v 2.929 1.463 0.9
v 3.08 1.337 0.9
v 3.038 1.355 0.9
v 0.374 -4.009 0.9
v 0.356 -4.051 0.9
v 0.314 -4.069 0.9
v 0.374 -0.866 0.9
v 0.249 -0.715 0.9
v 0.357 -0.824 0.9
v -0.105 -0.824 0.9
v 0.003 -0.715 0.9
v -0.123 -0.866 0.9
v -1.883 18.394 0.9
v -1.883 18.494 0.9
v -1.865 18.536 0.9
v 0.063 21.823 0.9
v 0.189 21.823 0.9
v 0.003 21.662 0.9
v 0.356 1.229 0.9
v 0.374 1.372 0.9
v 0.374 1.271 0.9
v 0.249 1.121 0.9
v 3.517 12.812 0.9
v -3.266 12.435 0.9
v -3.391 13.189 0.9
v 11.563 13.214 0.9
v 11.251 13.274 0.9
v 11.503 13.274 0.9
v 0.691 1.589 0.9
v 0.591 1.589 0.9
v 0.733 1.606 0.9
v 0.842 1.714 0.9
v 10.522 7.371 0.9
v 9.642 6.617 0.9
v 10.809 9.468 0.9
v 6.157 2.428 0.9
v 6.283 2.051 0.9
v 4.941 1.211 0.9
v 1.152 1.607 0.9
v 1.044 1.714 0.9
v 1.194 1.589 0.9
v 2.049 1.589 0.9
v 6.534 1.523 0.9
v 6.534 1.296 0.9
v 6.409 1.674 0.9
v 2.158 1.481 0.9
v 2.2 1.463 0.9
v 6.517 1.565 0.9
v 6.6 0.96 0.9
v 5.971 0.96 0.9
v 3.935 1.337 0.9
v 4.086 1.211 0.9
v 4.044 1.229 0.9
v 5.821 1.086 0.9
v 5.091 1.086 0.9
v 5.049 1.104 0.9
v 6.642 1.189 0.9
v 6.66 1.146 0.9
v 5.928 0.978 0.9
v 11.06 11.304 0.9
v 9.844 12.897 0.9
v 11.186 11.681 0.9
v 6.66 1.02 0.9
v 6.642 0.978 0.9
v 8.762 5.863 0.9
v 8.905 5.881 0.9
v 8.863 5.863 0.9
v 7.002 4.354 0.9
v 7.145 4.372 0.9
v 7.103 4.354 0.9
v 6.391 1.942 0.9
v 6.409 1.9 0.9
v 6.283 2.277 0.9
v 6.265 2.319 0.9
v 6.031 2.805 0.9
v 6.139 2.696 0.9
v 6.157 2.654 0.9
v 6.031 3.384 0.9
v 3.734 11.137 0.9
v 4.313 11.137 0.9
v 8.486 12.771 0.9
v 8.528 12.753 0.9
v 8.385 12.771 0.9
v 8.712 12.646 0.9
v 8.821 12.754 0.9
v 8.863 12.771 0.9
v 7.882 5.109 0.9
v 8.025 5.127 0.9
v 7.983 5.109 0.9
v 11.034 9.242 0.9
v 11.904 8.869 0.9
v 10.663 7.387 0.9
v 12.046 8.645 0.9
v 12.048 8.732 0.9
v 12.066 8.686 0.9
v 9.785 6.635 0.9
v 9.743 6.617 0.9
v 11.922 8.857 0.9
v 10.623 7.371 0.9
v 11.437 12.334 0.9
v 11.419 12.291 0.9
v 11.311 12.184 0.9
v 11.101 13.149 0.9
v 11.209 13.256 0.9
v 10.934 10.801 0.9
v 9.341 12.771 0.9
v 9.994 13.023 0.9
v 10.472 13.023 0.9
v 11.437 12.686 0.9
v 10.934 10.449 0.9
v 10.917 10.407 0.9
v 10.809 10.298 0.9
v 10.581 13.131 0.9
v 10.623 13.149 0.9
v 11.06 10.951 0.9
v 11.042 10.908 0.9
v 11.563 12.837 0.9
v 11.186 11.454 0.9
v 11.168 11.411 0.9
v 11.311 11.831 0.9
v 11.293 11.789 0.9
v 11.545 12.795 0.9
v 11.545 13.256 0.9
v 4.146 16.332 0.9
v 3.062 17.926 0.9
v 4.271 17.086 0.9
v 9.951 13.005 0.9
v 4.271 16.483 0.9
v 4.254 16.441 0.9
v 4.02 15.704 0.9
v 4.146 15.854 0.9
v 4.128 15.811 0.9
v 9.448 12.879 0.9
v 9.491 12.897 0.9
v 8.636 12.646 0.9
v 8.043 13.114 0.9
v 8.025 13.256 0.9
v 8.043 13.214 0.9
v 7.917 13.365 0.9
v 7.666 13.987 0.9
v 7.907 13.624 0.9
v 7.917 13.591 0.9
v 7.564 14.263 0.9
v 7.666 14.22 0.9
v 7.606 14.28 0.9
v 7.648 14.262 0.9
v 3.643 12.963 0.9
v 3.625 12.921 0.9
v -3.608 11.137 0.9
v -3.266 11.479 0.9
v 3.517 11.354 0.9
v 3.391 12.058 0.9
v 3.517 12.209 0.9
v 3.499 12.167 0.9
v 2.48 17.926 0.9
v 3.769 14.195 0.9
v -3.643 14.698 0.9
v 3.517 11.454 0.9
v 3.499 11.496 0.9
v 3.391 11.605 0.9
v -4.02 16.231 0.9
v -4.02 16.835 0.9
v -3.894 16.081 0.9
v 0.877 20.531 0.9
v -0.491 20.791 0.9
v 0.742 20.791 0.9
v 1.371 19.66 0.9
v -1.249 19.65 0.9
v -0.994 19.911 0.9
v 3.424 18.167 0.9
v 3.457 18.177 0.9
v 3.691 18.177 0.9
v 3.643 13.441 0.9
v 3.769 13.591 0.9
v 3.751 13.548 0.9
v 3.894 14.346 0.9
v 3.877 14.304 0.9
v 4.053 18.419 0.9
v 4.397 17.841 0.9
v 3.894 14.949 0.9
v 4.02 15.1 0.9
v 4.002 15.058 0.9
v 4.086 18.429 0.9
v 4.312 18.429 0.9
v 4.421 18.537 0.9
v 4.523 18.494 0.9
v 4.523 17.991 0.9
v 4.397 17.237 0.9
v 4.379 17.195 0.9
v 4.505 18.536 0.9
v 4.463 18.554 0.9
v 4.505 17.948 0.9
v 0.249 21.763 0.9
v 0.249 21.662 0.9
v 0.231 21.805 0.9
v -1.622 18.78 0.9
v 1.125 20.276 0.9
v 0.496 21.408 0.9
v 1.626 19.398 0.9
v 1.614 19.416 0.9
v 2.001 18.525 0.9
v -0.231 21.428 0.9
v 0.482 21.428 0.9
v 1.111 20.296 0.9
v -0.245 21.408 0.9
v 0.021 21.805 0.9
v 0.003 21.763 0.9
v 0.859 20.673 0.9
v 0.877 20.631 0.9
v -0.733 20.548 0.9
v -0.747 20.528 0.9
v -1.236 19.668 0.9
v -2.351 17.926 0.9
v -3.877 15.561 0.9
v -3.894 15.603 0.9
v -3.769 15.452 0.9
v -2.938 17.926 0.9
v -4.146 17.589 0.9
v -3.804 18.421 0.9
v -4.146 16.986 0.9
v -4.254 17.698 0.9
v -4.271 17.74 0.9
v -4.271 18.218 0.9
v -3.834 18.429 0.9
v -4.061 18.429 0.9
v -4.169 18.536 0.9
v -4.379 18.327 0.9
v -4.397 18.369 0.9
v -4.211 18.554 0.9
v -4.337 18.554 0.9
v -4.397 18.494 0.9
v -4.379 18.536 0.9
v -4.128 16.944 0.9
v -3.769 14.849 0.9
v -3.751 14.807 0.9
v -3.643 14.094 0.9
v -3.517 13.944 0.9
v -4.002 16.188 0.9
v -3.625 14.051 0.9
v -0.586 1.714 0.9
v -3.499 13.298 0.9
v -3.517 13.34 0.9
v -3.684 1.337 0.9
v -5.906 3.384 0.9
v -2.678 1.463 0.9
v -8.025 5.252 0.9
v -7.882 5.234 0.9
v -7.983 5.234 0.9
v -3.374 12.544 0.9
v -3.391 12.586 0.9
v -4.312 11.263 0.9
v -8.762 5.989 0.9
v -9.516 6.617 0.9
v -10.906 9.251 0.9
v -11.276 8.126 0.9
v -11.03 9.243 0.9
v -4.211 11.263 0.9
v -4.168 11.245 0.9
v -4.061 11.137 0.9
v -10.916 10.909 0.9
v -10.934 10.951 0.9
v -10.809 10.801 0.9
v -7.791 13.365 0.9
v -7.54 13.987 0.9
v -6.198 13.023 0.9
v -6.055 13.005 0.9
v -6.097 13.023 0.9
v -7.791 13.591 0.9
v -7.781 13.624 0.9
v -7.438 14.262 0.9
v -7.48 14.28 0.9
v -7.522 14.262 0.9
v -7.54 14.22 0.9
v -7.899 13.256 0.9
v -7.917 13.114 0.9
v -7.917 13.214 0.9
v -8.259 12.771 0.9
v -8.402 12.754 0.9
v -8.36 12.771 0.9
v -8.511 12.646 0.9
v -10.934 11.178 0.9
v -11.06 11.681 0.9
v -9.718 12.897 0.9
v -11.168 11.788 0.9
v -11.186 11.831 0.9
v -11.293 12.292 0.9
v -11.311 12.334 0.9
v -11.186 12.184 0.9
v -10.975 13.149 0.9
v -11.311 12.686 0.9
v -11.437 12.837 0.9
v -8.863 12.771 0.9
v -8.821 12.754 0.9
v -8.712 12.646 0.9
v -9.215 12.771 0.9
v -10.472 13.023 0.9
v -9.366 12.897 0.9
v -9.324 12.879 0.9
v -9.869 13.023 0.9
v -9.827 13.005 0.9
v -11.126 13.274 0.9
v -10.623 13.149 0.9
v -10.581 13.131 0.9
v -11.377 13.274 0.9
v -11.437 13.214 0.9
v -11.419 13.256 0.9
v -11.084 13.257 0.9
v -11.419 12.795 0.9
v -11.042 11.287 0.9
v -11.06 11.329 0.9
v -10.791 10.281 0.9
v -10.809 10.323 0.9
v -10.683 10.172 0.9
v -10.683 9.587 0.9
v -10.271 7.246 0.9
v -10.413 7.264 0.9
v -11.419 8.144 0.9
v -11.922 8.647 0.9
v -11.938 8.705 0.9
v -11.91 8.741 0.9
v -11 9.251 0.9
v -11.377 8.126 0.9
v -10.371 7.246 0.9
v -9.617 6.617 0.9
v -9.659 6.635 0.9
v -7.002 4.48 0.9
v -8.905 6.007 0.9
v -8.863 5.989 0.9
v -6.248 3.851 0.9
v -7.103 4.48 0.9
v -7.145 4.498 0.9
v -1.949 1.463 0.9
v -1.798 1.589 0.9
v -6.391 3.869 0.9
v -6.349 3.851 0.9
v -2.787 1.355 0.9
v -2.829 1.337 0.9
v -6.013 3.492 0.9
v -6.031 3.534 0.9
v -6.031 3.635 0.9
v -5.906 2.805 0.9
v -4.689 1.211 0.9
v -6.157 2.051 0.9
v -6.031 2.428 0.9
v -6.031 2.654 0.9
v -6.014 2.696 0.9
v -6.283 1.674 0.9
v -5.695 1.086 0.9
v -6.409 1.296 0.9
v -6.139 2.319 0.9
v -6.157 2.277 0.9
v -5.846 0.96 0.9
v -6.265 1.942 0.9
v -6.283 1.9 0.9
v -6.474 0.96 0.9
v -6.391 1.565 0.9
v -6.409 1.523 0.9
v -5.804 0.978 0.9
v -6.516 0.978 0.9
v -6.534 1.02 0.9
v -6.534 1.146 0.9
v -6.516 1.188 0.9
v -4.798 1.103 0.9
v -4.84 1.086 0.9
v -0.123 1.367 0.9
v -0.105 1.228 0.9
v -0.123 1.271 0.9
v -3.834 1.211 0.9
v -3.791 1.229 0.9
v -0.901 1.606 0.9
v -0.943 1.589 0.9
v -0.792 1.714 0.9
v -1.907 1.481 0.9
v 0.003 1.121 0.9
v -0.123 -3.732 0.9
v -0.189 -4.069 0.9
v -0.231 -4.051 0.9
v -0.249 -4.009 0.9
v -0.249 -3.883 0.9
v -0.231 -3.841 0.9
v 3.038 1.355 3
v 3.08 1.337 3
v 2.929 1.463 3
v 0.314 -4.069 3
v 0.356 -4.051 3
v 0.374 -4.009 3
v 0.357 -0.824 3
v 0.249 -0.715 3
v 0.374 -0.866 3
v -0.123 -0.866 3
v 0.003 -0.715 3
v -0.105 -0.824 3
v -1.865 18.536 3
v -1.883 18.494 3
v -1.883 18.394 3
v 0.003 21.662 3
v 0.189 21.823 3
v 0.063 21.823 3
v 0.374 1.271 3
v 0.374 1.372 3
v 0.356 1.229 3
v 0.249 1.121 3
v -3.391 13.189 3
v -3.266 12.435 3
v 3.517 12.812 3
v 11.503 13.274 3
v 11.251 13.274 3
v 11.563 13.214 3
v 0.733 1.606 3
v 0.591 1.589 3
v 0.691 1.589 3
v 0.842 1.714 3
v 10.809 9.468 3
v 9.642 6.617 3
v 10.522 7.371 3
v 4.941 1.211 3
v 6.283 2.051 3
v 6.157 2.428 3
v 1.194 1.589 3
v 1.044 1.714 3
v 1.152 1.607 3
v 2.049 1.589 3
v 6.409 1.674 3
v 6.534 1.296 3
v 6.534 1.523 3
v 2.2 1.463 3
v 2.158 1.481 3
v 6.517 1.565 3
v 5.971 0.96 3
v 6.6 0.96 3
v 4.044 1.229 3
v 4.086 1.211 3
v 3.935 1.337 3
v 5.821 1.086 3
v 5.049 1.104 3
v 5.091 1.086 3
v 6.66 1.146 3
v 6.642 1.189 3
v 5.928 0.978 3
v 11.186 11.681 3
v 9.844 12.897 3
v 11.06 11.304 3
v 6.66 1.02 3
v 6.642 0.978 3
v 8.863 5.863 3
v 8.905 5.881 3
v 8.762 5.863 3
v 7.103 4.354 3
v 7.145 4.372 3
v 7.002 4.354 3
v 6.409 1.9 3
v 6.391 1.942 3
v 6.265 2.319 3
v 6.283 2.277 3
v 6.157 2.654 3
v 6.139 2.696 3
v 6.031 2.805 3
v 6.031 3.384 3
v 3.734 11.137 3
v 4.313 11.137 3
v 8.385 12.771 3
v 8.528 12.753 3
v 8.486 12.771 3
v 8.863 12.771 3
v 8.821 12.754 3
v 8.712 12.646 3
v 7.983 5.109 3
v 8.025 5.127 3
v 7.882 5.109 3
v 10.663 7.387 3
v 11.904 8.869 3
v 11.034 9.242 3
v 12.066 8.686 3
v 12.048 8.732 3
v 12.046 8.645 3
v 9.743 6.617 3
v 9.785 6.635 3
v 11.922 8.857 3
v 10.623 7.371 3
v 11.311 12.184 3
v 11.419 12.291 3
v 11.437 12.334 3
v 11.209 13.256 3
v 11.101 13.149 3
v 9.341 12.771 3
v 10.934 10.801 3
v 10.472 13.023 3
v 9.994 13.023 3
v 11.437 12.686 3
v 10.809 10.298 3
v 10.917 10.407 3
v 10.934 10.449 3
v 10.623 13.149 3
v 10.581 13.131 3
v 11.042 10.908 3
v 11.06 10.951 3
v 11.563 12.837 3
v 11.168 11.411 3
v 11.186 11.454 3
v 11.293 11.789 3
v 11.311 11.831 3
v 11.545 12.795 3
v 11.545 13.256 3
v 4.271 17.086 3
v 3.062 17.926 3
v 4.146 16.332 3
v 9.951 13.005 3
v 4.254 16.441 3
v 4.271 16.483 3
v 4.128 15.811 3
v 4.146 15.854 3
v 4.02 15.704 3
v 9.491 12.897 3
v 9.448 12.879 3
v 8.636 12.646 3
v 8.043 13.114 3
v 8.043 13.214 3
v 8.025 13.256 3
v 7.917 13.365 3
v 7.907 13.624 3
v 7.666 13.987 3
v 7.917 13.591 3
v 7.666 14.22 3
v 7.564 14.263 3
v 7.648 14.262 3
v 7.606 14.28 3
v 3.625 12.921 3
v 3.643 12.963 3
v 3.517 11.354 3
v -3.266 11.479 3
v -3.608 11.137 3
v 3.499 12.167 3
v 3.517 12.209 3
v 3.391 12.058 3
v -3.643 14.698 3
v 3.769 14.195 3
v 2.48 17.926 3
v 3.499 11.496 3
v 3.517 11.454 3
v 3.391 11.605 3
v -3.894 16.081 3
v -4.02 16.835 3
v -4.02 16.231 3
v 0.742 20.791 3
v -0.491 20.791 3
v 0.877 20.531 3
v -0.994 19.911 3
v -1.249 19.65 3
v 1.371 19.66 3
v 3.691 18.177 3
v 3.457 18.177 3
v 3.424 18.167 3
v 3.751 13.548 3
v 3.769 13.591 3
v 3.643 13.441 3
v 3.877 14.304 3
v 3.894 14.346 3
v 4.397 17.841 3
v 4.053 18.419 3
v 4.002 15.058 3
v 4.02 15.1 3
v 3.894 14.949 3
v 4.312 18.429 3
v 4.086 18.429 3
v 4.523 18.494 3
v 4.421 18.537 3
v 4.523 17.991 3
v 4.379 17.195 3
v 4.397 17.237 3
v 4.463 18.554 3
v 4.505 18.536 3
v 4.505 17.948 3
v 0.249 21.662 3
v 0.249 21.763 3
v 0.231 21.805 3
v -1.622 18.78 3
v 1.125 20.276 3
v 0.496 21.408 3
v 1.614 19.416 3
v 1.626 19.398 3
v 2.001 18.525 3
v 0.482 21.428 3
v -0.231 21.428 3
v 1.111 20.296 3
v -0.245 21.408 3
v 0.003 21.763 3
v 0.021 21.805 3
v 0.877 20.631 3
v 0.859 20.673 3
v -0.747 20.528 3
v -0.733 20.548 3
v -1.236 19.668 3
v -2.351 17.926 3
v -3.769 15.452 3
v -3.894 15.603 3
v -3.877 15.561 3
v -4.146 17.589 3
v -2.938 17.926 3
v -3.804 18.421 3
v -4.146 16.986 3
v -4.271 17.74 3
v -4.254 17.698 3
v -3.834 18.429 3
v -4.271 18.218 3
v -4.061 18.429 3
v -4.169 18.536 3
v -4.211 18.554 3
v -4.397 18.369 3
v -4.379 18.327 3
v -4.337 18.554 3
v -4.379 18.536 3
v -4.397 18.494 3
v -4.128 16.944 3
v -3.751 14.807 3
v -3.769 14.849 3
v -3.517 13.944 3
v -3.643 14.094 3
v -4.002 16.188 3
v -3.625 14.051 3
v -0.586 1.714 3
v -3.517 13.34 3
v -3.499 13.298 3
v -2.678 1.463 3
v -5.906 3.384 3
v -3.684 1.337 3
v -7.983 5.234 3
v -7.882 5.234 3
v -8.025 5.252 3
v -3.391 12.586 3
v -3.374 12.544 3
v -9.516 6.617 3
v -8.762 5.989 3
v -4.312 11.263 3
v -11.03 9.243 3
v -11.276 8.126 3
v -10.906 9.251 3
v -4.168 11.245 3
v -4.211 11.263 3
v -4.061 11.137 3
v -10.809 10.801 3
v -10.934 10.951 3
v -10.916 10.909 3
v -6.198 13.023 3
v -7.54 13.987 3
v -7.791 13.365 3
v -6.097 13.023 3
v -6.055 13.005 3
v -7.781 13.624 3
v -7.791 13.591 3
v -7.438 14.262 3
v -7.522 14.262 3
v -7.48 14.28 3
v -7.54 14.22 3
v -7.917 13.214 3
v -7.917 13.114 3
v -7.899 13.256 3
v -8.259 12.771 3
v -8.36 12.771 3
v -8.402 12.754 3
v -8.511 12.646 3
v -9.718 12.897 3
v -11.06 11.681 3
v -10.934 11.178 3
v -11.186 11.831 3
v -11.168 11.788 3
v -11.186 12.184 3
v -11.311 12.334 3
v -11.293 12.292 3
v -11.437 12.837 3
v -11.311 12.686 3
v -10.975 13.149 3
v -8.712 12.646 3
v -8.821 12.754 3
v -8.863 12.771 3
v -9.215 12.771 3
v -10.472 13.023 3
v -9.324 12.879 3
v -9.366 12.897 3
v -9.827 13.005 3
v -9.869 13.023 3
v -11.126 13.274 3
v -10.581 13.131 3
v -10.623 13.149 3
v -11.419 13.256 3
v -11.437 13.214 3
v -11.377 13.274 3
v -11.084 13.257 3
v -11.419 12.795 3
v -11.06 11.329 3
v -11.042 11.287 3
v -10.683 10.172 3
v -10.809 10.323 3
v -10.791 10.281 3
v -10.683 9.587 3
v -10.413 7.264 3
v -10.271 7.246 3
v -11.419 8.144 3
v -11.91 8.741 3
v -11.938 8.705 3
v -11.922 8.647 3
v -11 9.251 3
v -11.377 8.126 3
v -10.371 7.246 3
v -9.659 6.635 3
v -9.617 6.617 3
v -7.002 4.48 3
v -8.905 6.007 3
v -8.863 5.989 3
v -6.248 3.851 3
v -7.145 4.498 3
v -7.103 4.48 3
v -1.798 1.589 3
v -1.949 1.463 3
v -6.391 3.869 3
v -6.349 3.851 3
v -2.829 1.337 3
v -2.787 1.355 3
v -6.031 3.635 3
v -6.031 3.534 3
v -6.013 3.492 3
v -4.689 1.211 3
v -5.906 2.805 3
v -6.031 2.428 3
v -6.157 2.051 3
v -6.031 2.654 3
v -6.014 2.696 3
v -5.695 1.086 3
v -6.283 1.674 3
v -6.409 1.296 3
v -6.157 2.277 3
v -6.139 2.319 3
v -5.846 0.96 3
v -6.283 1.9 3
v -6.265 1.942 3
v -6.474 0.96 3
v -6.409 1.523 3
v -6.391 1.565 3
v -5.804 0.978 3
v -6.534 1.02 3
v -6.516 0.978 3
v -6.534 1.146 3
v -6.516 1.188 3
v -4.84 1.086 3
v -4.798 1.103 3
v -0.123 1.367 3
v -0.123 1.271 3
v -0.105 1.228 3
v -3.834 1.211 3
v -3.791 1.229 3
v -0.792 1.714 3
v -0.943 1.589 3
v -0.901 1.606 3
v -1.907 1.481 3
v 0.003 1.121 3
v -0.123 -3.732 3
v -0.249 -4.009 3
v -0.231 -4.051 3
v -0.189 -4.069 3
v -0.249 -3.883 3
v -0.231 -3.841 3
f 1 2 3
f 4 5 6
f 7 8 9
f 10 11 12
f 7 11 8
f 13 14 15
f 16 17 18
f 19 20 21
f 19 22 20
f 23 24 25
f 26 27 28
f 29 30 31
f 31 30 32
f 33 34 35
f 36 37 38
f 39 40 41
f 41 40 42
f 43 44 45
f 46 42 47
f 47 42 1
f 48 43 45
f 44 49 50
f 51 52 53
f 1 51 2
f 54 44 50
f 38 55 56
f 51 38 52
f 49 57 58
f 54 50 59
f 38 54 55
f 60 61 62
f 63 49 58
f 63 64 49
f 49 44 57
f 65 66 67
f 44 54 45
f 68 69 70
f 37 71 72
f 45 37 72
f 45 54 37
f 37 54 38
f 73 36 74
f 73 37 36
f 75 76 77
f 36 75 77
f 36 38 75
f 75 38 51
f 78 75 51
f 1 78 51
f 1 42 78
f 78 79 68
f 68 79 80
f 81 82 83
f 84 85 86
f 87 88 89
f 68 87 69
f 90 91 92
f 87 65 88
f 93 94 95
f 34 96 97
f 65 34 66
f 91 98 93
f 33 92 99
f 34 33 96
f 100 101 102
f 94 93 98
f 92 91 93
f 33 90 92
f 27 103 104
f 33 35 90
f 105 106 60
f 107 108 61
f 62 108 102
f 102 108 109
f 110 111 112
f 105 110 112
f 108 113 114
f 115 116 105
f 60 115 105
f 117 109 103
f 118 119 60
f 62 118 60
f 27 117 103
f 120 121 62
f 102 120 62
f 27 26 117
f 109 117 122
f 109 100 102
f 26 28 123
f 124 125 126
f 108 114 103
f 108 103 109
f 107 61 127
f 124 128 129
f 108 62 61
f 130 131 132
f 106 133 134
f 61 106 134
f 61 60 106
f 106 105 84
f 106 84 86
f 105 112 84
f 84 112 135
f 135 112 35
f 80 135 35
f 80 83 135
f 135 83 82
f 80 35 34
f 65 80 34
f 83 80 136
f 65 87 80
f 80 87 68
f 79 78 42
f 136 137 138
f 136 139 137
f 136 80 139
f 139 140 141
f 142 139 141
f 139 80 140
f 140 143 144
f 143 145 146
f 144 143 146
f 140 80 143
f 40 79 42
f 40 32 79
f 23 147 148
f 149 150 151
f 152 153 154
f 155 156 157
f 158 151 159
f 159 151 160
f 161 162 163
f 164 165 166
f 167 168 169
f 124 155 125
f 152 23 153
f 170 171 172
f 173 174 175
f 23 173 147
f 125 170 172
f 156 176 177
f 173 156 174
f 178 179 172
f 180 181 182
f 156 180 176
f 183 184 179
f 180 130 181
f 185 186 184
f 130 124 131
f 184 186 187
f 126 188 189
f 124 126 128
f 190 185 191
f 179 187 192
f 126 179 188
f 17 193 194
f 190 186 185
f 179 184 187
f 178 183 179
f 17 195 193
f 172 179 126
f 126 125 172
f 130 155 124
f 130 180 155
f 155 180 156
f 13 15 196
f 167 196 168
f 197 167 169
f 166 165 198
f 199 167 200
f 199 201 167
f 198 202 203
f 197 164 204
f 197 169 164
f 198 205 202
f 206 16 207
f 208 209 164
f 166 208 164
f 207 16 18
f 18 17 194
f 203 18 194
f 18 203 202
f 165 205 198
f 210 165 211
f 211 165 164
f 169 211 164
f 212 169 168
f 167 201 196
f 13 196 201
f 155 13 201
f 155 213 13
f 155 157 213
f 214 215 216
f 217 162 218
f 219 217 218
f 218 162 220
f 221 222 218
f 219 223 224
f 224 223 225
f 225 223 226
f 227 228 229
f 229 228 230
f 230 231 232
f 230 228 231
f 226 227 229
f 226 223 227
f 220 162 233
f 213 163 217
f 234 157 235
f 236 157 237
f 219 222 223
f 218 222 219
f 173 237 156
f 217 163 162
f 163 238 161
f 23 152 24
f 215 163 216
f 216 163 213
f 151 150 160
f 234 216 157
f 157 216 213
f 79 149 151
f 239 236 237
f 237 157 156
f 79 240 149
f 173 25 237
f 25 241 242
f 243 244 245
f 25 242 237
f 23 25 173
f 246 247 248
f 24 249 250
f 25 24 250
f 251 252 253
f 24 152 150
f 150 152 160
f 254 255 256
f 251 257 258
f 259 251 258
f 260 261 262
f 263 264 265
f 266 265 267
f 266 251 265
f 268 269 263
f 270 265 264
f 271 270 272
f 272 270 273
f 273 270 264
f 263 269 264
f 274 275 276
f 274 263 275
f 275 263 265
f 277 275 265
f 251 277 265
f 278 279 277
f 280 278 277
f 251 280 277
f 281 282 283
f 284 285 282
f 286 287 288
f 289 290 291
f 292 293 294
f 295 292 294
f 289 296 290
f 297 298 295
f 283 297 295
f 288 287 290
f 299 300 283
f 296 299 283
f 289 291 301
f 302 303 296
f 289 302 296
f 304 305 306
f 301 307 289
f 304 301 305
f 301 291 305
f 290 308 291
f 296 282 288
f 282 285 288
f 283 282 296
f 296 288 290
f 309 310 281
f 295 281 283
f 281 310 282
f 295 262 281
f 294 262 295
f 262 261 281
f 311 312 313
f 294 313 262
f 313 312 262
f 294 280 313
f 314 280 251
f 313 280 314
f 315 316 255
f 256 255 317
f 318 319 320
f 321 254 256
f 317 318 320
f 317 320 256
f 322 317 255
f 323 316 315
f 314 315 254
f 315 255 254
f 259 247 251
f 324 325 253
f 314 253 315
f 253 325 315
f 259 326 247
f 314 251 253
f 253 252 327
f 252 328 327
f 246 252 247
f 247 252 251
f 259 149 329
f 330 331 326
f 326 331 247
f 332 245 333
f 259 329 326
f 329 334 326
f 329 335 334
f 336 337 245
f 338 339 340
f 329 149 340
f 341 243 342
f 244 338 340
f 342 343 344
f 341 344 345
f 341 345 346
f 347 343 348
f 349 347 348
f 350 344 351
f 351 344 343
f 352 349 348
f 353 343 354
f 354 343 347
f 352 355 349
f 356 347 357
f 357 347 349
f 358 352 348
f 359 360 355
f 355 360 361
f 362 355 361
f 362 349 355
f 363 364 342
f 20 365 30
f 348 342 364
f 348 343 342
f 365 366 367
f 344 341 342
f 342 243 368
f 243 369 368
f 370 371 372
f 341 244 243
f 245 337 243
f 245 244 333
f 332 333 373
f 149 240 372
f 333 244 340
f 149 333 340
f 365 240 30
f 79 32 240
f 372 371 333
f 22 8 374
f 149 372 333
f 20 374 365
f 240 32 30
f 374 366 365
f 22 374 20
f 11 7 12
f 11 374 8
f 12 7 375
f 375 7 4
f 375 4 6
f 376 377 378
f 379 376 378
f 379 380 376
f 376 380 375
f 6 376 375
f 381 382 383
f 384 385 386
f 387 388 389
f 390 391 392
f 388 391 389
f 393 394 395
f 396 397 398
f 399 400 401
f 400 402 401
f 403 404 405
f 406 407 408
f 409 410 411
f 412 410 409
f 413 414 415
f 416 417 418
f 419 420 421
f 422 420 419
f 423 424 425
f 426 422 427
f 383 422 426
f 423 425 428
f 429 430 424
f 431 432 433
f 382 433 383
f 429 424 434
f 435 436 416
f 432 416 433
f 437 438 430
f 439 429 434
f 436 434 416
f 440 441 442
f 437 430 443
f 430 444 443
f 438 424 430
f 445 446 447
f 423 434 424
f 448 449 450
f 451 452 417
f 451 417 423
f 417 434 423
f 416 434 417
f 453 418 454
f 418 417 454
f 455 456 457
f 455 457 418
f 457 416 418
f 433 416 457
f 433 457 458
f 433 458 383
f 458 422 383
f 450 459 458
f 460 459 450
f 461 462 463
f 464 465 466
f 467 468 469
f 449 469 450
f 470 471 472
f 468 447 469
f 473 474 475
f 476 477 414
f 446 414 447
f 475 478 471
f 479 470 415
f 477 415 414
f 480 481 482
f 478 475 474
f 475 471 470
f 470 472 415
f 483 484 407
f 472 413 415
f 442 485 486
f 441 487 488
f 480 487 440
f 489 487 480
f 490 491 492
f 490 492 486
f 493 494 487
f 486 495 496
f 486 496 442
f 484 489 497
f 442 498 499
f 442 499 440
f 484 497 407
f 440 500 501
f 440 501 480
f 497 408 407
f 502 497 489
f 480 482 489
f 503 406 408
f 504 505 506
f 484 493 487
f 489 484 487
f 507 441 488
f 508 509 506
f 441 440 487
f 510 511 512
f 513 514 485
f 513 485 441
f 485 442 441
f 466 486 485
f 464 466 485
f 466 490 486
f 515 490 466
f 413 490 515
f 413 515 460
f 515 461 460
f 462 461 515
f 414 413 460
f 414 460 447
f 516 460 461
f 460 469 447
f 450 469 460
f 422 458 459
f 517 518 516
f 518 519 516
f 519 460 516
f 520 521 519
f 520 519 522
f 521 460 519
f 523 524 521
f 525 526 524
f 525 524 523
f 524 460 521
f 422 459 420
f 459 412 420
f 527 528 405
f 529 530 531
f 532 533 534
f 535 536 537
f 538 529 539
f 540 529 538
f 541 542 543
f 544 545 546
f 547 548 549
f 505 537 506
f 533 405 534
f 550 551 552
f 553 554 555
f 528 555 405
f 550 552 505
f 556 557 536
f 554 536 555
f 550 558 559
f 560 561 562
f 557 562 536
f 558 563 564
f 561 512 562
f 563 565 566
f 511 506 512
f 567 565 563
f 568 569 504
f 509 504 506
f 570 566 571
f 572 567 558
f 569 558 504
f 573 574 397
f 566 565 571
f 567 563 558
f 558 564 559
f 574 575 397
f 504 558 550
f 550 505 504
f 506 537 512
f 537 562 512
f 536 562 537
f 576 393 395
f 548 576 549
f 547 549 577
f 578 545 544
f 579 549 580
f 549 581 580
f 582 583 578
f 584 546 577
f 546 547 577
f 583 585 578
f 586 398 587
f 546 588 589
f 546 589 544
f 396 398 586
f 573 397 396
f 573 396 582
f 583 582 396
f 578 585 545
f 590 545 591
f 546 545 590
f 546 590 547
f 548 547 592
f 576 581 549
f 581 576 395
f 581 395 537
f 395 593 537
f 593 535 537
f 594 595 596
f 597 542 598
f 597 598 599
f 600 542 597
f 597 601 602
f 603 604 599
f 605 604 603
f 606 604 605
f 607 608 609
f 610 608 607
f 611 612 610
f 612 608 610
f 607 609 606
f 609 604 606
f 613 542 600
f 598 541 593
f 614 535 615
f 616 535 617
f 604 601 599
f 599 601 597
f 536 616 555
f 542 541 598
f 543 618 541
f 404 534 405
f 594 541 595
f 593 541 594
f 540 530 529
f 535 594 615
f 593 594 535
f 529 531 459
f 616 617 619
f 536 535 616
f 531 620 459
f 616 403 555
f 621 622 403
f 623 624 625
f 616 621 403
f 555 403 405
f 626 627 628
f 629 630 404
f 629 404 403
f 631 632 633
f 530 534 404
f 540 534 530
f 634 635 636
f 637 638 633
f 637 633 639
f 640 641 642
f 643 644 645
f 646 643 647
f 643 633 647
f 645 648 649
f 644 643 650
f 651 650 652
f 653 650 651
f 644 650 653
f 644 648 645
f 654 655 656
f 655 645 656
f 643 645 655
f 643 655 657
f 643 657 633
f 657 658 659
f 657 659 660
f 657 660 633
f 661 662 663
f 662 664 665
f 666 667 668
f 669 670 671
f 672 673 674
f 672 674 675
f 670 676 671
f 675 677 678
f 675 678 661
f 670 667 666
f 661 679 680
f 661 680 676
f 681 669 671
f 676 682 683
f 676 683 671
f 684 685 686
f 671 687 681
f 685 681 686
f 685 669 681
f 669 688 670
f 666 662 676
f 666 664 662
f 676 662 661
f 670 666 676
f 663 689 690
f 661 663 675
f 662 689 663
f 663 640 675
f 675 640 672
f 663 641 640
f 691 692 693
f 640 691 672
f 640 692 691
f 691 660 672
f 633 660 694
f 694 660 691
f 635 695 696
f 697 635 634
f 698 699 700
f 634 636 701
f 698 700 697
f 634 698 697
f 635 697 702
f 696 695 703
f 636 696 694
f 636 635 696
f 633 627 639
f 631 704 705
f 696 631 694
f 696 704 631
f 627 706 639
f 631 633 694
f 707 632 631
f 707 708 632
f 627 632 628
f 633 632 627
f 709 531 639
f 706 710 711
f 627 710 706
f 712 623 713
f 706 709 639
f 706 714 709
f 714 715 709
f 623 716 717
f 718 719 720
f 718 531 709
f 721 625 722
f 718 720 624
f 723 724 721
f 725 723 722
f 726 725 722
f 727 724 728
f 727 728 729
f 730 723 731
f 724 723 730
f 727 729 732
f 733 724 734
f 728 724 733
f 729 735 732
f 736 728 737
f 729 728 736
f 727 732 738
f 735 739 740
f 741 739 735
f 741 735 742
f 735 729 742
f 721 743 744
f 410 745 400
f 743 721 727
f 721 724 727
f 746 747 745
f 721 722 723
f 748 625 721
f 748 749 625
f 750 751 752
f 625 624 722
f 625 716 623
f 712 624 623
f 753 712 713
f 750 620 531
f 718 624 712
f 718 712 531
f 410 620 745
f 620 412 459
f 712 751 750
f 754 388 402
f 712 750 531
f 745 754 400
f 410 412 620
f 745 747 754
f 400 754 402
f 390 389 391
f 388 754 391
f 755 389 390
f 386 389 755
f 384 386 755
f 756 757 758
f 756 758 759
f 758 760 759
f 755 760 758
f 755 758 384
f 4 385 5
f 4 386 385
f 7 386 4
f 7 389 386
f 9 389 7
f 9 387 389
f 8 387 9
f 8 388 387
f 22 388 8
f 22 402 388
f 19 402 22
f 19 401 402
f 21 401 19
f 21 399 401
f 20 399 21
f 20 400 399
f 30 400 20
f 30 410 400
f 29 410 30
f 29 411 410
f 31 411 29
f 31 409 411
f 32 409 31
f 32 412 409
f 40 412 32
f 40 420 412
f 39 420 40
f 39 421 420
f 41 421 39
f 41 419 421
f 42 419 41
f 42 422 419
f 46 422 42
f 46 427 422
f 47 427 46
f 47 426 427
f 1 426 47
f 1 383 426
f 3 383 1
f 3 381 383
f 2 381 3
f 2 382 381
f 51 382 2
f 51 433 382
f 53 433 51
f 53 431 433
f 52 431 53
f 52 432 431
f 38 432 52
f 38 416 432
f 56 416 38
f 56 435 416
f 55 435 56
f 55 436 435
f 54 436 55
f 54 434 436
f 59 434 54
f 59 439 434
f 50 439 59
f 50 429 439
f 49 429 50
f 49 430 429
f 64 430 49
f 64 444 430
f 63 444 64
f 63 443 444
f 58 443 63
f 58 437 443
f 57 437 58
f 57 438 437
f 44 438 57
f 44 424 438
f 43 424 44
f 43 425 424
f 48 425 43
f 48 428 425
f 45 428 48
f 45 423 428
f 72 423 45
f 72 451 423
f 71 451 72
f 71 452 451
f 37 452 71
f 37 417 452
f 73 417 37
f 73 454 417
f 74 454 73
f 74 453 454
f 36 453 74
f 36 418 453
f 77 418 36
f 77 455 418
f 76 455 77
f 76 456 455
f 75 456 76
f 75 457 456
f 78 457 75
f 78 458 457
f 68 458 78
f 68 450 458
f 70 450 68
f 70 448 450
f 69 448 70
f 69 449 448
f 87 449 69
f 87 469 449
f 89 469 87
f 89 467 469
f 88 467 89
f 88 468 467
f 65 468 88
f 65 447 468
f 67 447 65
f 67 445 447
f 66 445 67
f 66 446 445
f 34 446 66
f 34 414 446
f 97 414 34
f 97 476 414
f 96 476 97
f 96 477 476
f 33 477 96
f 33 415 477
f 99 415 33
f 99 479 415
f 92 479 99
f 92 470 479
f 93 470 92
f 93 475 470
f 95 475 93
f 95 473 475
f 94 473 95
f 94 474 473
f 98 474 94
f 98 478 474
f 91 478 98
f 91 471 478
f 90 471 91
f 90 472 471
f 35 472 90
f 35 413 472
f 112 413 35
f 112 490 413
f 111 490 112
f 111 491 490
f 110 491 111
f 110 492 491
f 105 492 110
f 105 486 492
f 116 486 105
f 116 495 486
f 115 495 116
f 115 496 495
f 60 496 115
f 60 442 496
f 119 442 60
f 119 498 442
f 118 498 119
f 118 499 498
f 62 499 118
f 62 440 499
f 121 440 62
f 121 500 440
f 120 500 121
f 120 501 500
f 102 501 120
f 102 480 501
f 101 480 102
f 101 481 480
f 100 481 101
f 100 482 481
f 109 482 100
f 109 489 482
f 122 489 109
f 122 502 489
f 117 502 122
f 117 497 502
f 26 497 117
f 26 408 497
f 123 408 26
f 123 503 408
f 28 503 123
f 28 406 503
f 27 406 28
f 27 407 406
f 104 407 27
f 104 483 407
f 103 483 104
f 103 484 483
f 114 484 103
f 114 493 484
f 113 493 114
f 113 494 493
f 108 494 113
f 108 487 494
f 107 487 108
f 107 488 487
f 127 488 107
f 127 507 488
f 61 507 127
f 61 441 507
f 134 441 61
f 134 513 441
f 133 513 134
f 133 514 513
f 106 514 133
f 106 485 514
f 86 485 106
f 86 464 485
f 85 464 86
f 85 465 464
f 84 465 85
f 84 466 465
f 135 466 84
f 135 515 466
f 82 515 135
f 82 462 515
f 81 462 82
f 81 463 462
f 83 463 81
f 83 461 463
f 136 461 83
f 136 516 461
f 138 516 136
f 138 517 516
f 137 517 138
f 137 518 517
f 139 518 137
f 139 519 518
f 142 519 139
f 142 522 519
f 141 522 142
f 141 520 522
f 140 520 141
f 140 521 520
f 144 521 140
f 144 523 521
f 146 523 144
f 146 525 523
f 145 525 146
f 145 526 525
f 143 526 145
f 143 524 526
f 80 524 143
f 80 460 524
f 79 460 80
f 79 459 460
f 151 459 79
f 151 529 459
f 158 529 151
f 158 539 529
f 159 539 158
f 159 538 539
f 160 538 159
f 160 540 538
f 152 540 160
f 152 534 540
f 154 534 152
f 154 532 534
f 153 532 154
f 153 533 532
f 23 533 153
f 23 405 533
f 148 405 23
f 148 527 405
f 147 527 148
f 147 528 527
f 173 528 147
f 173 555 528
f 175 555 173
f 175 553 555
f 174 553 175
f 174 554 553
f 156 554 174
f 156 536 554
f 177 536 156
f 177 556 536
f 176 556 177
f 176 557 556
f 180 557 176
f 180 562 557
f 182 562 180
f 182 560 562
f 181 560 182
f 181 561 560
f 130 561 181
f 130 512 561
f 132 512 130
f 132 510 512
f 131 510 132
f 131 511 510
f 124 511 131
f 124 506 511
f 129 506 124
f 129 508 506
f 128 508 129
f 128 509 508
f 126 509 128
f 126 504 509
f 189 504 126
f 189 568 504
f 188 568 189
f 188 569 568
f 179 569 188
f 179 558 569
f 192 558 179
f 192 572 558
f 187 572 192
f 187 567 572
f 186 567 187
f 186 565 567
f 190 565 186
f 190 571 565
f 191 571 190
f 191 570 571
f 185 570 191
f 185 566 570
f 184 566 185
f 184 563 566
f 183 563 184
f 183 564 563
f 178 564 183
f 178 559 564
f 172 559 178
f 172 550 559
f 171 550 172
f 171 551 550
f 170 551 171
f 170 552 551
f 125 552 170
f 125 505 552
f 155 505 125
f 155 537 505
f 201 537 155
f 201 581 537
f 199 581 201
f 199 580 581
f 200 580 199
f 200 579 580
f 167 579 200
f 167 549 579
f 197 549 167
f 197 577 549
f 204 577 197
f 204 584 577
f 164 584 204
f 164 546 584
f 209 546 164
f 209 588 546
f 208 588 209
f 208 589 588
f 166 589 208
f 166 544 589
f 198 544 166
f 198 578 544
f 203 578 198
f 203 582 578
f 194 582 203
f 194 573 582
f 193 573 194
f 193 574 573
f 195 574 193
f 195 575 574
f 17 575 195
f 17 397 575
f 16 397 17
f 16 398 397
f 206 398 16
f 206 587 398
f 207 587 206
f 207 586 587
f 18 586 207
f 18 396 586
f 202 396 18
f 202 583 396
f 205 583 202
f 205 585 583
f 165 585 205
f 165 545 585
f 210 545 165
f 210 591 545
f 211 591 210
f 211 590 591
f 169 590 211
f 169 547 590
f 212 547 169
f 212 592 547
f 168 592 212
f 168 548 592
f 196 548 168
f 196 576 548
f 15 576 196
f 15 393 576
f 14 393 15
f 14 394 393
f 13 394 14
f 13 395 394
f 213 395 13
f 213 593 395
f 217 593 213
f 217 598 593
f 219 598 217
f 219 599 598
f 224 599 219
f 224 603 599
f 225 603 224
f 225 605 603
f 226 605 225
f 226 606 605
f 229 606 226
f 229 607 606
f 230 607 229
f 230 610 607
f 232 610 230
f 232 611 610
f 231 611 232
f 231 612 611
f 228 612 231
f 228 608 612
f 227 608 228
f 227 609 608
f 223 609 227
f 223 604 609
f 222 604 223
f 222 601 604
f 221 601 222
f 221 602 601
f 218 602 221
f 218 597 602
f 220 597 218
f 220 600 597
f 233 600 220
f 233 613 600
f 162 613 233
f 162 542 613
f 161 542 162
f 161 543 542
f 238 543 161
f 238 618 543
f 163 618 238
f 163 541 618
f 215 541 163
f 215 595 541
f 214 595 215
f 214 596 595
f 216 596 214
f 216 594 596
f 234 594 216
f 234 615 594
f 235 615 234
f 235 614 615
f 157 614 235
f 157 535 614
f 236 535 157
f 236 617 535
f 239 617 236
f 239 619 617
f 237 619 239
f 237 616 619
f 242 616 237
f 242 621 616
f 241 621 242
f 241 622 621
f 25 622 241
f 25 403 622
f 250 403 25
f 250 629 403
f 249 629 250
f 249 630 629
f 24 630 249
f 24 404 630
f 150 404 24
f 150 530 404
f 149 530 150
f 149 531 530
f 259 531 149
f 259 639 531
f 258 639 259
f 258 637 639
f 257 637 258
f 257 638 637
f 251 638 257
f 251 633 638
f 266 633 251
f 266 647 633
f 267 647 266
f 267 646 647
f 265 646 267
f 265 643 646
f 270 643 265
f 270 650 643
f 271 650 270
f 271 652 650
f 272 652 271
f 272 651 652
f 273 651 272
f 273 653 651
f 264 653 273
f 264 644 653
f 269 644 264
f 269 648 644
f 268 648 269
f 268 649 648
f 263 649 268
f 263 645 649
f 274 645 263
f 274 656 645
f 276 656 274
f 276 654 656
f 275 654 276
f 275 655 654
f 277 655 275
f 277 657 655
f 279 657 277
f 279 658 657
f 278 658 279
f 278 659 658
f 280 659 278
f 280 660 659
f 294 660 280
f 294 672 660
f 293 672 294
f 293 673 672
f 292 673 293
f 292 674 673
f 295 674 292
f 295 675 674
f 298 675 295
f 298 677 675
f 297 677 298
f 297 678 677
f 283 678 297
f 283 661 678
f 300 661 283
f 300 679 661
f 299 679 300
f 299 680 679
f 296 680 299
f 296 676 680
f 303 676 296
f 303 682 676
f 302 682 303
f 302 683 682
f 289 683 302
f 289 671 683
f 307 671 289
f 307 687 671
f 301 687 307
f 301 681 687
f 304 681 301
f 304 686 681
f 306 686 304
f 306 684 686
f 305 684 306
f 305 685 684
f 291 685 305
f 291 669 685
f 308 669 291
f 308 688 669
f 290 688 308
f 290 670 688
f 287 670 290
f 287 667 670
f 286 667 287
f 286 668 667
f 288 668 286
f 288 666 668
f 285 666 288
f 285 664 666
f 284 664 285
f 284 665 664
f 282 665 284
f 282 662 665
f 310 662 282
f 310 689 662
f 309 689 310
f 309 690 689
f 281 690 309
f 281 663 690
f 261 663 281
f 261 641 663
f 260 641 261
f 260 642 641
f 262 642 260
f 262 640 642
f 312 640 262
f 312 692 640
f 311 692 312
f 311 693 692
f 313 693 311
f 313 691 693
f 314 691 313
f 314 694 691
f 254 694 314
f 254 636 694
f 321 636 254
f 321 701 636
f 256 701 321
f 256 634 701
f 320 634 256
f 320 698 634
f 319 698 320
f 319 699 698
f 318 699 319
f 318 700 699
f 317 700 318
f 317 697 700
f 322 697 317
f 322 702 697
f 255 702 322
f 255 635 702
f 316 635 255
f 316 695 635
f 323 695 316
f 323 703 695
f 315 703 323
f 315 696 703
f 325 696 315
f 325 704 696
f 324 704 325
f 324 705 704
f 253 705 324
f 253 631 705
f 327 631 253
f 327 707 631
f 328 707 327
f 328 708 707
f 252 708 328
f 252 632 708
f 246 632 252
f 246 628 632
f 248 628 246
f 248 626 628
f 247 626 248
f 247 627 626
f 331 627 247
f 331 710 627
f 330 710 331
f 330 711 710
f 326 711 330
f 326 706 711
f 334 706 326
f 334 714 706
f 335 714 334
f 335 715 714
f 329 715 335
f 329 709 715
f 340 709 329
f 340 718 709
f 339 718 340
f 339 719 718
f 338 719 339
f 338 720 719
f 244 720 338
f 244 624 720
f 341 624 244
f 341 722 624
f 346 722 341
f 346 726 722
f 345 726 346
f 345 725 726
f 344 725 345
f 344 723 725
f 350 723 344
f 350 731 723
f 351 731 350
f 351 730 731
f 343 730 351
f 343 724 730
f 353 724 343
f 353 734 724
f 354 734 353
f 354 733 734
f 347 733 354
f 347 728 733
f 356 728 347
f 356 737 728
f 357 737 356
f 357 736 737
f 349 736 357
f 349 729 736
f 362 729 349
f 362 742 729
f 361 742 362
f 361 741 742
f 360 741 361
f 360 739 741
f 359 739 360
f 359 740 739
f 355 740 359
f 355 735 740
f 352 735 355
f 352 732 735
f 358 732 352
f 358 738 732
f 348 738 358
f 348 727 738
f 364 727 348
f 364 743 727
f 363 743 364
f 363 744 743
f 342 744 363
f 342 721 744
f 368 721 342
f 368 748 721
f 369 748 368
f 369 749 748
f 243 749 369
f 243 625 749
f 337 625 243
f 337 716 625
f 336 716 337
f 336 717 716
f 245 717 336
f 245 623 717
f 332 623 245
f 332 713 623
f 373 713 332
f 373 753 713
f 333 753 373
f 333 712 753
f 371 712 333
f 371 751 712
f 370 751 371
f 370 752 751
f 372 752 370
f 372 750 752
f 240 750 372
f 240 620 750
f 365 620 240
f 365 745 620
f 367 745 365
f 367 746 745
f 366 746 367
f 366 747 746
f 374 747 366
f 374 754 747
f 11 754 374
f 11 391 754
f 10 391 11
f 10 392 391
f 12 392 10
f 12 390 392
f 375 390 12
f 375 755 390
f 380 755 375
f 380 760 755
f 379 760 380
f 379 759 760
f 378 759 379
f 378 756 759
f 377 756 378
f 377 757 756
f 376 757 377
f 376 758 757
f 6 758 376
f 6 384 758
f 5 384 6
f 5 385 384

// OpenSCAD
$fn = 24;
translate([0, -2.500, 0.900])
  linear_extrude(height=2.100) {
offset(r=0.06, $fn=8) {
    polygon(points=[[0.189,24.263],[0.063,24.263],[0.063,24.137],[-0.189,23.886],[-0.440,23.257],[-0.691,23.006],[-0.943,22.377],[-1.194,22.126],[-1.571,21.246],[-1.823,20.994],[-1.823,20.869],[-2.326,20.366],[-2.954,20.366],[-3.834,20.869],[-4.086,20.869],[-4.211,20.994],[-4.337,20.994],[-4.337,20.869],[-4.211,20.743],[-4.211,20.240],[-4.086,20.114],[-4.086,19.486],[-3.960,19.360],[-3.960,18.731],[-3.834,18.606],[-3.834,18.103],[-3.709,17.977],[-3.709,17.349],[-3.583,17.223],[-3.583,16.594],[-3.457,16.469],[-3.457,15.840],[-3.331,15.714],[-3.331,15.086],[-3.206,14.960],[-3.206,13.954],[-3.583,13.577],[-4.086,13.577],[-4.211,13.703],[-4.337,13.703],[-6.097,15.463],[-6.223,15.463],[-7.480,16.720],[-7.480,16.469],[-7.731,16.091],[-7.731,15.840],[-7.857,15.714],[-7.857,15.589],[-8.234,15.211],[-8.360,15.211],[-8.486,15.086],[-8.737,15.086],[-8.863,15.211],[-9.240,15.211],[-9.366,15.337],[-9.743,15.337],[-9.869,15.463],[-10.497,15.463],[-10.623,15.589],[-11.000,15.589],[-11.126,15.714],[-11.377,15.714],[-11.377,15.337],[-11.251,15.211],[-11.251,14.834],[-11.126,14.709],[-11.126,14.331],[-11.000,14.206],[-11.000,13.829],[-10.874,13.703],[-10.874,13.451],[-10.749,13.326],[-10.749,12.823],[-10.623,12.697],[-10.623,12.069],[-10.874,11.691],[-11.000,11.691],[-11.880,11.189],[-11.377,10.686],[-11.251,10.686],[-10.371,9.806],[-10.246,9.806],[-9.617,9.177],[-9.491,9.177],[-8.863,8.549],[-8.737,8.549],[-7.983,7.794],[-7.857,7.794],[-7.103,7.040],[-6.977,7.040],[-6.349,6.411],[-6.223,6.411],[-5.971,6.160],[-5.971,6.034],[-5.846,5.909],[-5.846,5.280],[-5.971,5.154],[-5.971,4.903],[-6.097,4.777],[-6.097,4.526],[-6.223,4.400],[-6.223,4.149],[-6.349,4.023],[-6.349,3.771],[-6.474,3.646],[-6.474,3.520],[-5.846,3.520],[-5.720,3.646],[-4.840,3.646],[-4.714,3.771],[-3.834,3.771],[-3.709,3.897],[-2.829,3.897],[-2.703,4.023],[-1.949,4.023],[-1.823,4.149],[-0.943,4.149],[-0.817,4.274],[-0.566,4.274],[-0.063,3.897],[-0.063,3.771],[0.063,3.646],[0.063,1.760],[-0.063,1.634],[-0.063,-1.257],[-0.189,-1.383],[-0.189,-1.509],[0.314,-1.509],[0.314,1.634],[0.189,1.760],[0.189,3.646],[0.314,3.771],[0.314,3.897],[0.566,4.149],[0.691,4.149],[0.817,4.274],[1.069,4.274],[1.194,4.149],[2.074,4.149],[2.200,4.023],[2.954,4.023],[3.080,3.897],[3.960,3.897],[4.086,3.771],[4.966,3.771],[5.091,3.646],[5.846,3.646],[5.971,3.520],[6.600,3.520],[6.600,3.646],[6.474,3.771],[6.474,4.023],[6.349,4.149],[6.349,4.400],[6.223,4.526],[6.223,4.777],[6.097,4.903],[6.097,5.154],[5.971,5.280],[5.971,5.909],[6.977,6.914],[7.103,6.914],[7.857,7.669],[7.983,7.669],[8.737,8.423],[8.863,8.423],[9.617,9.177],[9.743,9.177],[10.497,9.931],[10.623,9.931],[12.006,11.189],[11.880,11.314],[11.000,11.691],[10.749,11.943],[10.749,12.823],[10.874,12.949],[10.874,13.326],[11.000,13.451],[11.000,13.829],[11.126,13.954],[11.126,14.206],[11.251,14.331],[11.251,14.709],[11.377,14.834],[11.377,15.211],[11.503,15.337],[11.503,15.714],[11.251,15.714],[11.126,15.589],[10.623,15.589],[10.497,15.463],[9.994,15.463],[9.869,15.337],[9.491,15.337],[9.366,15.211],[8.863,15.211],[8.737,15.086],[8.611,15.086],[8.486,15.211],[8.360,15.211],[7.983,15.589],[7.983,15.714],[7.857,15.840],[7.857,16.091],[7.606,16.469],[7.606,16.720],[4.337,13.577],[3.709,13.577],[3.457,13.829],[3.457,13.954],[3.331,14.080],[3.331,14.583],[3.457,14.709],[3.457,15.337],[3.583,15.463],[3.583,15.966],[3.709,16.091],[3.709,16.720],[3.834,16.846],[3.834,17.474],[3.960,17.600],[3.960,18.229],[4.086,18.354],[4.086,18.857],[4.211,18.983],[4.211,19.611],[4.337,19.737],[4.337,20.366],[4.463,20.491],[4.463,20.994],[4.337,20.869],[4.086,20.869],[3.709,20.617],[3.457,20.617],[3.080,20.366],[2.451,20.366],[1.949,20.994],[1.571,21.874],[1.320,22.126],[1.069,22.754],[0.817,23.006],[0.817,23.131],[0.691,23.257],[0.440,23.886],[0.189,24.137]], paths=[[0,1,2,3,4,5,6,7,8,9,10,11,12,13,14,15,16,17,18,19,20,21,22,23,24,25,26,27,28,29,30,31,32,33,34,35,36,37,38,39,40,41,42,43,44,45,46,47,48,49,50,51,52,53,54,55,56,57,58,59,60,61,62,63,64,65,66,67,68,69,70,71,72,73,74,75,76,77,78,79,80,81,82,83,84,85,86,87,88,89,90,91,92,93,94,95,96,97,98,99,100,101,102,103,104,105,106,107,108,109,110,111,112,113,114,115,116,117,118,119,120,121,122,123,124,125,126,127,128,129,130,131,132,133,134,135,136,137,138,139,140,141,142,143,144,145,146,147,148,149,150,151,152,153,154,155,156,157,158,159,160,161,162,163,164,165,166,167,168,169,170,171,172,173,174,175,176,177,178,179,180,181,182,183,184,185,186,187,188,189,190,191,192,193,194,195,196,197,198,199,200,201,202,203,204,205,206,207,208,209,210,211,212,213,214,215,216,217,218,219,220,221,222,223,224,225,226,227,228,229,230,231,232,233,234,235,236,237,238,239,240,241,242,243,244]]);
}
}
